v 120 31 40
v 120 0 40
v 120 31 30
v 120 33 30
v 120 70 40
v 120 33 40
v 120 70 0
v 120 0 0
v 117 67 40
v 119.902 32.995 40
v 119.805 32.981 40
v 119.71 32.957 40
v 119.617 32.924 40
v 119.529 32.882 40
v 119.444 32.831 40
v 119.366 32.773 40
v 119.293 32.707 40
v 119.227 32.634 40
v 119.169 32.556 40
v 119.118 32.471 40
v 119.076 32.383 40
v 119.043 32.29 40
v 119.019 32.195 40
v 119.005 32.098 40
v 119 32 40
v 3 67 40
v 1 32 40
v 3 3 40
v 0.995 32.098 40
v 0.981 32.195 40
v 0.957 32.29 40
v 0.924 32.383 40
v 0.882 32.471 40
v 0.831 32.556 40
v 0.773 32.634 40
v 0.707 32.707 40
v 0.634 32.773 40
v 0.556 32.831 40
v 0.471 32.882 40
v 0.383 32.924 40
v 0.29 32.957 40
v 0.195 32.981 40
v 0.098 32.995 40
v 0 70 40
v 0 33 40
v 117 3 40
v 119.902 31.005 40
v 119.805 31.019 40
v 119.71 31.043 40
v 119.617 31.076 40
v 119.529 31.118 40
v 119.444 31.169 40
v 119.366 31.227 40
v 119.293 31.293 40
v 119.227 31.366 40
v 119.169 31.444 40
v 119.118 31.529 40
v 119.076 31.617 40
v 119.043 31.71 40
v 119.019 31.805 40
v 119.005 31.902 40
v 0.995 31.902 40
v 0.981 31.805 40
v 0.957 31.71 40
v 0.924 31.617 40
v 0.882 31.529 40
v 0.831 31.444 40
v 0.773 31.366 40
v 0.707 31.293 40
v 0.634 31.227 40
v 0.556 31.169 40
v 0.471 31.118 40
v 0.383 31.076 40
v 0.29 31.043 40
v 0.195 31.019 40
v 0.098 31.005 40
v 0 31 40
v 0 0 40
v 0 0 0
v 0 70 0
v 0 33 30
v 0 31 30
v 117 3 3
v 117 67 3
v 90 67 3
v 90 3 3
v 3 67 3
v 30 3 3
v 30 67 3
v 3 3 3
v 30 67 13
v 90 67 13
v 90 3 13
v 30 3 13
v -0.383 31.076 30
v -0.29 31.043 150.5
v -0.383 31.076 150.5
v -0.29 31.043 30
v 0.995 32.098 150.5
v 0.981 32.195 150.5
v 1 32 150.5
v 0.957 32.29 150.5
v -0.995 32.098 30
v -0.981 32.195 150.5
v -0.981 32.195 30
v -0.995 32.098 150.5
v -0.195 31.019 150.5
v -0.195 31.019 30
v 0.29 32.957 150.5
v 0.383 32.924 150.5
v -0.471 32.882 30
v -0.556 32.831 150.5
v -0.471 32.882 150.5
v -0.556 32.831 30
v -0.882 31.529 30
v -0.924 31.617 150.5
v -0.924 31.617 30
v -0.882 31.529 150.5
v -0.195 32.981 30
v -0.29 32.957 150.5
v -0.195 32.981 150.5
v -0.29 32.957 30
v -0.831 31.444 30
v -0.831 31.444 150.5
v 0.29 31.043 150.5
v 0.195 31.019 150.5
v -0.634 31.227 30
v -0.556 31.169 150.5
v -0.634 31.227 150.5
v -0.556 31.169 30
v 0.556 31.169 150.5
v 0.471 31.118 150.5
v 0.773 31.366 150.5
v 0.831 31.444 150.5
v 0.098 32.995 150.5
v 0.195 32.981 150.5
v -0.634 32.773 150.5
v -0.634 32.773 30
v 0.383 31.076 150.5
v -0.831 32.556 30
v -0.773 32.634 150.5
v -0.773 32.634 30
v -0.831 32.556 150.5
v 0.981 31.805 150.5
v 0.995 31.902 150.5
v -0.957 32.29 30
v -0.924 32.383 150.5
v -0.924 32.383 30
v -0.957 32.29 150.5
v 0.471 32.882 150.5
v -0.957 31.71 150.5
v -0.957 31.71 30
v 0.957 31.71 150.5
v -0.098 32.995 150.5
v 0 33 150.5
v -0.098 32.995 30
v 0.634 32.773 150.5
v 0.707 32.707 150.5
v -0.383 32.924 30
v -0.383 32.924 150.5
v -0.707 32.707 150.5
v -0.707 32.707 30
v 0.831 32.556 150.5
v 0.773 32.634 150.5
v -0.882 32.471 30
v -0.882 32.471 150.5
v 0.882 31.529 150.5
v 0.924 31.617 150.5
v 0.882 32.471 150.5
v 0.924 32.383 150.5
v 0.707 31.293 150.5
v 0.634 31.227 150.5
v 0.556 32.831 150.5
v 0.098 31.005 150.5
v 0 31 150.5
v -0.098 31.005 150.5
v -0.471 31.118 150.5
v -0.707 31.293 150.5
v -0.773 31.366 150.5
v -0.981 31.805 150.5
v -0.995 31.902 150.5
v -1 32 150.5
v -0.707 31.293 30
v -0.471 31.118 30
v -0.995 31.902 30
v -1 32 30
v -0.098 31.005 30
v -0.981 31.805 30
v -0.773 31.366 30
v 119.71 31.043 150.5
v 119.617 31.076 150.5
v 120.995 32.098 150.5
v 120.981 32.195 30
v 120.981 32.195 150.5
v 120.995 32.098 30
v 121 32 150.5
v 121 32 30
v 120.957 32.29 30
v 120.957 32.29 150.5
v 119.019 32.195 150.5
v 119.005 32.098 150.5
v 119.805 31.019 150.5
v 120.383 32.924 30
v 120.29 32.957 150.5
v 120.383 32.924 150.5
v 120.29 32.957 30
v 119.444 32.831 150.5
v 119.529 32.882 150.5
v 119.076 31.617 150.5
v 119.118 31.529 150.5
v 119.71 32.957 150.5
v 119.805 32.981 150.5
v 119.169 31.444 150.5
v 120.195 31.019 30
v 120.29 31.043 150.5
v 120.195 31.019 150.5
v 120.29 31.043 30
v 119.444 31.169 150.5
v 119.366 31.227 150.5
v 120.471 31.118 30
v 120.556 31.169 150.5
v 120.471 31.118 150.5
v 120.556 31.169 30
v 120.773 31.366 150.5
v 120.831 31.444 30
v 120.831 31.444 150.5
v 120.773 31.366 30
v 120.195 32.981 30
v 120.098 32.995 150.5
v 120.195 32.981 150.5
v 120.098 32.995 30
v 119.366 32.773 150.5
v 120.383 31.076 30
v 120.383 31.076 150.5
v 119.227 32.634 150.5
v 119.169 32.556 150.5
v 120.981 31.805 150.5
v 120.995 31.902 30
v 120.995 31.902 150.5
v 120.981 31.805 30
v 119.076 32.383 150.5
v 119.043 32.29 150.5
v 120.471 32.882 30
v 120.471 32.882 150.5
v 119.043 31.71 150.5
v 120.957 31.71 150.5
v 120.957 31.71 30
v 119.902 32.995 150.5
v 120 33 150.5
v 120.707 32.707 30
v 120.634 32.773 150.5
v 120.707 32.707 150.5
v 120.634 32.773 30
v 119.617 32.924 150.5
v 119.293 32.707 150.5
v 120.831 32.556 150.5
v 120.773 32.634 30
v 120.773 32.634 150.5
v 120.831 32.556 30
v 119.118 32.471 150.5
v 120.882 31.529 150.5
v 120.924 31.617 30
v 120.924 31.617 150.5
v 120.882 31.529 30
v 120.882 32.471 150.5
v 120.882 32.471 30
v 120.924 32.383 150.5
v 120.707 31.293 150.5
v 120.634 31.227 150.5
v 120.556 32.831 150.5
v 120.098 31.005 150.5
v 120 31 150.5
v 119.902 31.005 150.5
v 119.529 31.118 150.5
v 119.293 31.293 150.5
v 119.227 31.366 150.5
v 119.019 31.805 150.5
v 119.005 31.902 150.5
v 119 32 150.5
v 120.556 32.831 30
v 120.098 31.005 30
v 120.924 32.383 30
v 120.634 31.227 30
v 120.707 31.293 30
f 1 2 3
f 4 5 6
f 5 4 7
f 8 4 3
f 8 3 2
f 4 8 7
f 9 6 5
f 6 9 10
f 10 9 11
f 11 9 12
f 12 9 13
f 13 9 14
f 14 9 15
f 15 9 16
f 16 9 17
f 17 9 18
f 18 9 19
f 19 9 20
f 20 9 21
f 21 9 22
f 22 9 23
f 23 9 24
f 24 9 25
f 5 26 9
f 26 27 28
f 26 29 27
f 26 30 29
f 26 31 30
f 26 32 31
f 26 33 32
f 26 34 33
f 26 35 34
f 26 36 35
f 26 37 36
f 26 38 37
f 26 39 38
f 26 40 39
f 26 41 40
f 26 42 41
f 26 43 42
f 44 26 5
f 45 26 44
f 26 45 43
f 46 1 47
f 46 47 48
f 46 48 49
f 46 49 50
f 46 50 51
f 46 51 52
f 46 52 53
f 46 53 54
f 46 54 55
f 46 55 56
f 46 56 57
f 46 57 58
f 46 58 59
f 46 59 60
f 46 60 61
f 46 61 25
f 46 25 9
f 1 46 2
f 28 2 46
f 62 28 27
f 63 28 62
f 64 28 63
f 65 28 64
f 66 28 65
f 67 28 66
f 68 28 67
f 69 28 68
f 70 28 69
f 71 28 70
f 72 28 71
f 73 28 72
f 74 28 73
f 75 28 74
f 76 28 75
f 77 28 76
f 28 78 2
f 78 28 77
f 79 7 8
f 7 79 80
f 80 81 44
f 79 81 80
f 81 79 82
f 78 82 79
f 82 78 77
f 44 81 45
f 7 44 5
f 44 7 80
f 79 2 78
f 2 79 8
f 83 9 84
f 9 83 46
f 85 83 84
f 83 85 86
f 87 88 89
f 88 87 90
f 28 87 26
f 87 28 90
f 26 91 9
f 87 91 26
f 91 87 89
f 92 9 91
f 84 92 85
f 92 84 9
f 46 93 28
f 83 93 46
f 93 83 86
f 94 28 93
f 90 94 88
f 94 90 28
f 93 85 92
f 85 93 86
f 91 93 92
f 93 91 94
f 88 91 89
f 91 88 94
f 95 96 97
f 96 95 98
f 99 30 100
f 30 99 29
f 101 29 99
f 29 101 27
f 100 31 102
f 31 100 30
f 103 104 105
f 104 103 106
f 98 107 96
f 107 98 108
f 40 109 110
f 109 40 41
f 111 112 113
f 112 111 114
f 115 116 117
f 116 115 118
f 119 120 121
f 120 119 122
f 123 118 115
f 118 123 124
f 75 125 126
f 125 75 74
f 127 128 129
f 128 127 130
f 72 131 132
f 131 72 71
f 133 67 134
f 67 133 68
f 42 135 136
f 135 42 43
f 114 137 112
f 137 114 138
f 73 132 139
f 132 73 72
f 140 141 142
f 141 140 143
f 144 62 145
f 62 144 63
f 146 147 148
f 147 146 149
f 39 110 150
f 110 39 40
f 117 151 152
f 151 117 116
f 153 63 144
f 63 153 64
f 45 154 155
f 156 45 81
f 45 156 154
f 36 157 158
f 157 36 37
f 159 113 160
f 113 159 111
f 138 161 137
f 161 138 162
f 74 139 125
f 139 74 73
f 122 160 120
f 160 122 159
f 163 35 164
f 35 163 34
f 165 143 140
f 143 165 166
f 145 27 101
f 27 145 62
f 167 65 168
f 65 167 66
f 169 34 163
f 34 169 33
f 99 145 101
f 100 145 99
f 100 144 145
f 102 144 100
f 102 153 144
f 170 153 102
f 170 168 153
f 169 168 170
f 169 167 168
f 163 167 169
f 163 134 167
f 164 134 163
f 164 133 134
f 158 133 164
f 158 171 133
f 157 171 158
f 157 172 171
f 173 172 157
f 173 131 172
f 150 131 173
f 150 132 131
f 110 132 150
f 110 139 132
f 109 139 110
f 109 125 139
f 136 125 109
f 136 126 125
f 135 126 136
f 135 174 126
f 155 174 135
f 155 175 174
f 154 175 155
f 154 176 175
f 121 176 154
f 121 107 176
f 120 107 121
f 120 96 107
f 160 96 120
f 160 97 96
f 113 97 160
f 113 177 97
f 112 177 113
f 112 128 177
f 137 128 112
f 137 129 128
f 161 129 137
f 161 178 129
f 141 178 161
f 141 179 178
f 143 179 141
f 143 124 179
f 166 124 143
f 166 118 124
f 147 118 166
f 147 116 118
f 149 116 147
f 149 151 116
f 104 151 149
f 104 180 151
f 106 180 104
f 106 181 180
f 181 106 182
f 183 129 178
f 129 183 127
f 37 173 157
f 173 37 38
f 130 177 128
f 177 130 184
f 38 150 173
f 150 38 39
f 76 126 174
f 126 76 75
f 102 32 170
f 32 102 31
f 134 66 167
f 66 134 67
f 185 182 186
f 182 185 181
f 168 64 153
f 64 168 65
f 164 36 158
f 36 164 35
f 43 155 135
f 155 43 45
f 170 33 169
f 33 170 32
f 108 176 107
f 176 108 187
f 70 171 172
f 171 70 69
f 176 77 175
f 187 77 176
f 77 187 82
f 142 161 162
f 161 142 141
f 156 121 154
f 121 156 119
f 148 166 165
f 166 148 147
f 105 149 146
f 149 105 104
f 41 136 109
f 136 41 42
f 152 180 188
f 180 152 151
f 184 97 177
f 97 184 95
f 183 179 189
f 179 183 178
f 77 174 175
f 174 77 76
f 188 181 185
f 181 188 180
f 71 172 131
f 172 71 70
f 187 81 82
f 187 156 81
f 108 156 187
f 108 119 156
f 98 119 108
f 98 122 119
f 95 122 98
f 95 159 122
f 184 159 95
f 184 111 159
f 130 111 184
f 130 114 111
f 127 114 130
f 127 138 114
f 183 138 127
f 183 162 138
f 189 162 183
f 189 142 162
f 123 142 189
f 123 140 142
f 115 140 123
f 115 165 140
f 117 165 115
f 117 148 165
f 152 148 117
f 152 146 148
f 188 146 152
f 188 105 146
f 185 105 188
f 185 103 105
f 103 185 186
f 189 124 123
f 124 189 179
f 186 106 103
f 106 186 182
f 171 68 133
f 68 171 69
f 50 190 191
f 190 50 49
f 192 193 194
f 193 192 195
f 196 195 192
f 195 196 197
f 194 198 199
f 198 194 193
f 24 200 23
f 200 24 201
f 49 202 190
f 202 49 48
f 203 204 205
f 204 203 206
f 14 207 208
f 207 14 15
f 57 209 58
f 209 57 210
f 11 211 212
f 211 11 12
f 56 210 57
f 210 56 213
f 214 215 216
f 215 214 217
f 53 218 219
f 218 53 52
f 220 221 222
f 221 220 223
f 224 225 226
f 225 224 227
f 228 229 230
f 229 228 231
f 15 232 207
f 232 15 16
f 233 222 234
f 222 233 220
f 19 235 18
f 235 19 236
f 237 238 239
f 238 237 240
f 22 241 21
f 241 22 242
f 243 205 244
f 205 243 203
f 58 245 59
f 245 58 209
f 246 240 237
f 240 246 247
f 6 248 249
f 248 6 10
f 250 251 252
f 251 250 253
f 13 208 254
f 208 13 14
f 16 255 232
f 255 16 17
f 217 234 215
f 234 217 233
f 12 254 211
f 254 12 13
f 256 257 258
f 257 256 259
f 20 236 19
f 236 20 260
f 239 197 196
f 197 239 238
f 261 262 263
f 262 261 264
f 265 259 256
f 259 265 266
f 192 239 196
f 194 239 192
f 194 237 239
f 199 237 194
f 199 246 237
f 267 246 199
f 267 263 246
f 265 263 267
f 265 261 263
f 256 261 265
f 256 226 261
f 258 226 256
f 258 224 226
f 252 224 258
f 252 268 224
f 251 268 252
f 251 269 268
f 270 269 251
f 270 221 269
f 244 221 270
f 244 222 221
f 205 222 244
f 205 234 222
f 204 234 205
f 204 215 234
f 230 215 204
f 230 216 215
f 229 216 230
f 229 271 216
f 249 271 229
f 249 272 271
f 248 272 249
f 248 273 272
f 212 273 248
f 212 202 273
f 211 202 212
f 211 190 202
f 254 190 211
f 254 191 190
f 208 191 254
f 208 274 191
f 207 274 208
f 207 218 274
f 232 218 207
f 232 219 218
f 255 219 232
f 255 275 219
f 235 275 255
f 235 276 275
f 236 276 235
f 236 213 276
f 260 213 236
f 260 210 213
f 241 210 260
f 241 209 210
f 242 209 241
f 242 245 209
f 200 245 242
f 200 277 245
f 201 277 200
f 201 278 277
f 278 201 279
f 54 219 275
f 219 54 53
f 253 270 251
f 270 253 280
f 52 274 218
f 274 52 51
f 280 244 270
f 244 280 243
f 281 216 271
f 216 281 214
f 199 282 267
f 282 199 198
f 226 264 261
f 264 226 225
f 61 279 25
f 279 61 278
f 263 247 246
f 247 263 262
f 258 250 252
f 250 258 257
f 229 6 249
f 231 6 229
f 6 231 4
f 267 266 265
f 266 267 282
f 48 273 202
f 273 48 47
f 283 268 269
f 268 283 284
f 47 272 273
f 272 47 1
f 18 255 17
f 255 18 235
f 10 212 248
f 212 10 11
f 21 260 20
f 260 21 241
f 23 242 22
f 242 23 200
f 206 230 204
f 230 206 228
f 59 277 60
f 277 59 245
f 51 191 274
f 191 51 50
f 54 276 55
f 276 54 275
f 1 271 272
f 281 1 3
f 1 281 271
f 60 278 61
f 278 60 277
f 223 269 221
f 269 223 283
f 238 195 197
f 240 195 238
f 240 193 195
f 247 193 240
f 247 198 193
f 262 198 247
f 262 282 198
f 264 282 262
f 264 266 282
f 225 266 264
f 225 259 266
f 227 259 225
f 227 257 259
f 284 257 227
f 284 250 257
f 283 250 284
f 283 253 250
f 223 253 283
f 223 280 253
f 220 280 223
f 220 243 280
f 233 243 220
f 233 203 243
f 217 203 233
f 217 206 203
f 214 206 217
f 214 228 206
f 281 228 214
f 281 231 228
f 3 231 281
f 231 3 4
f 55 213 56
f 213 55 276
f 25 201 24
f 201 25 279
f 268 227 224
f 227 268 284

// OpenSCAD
// Buffer Tank for Mini Horizontal Gel Electrophoresis
// Units: millimetres

// Outer Dimensions
$outer_x = 120;
$outer_y = 70;
$outer_z = 40;

// Wall and Floor Thickness
$wall_thickness = 3;
$floor_thickness = 3;

// Platform Dimensions
$platform_length = 60; // X dimension
$platform_width = $outer_y - (2 * $wall_thickness); // Spans full inner width
$platform_height = 10; // Height above inner floor
$platform_top_z = $floor_thickness + $platform_height; // Absolute Z of top surface

// Hole Dimensions
$hole_diameter = 2;
$hole_y = ($outer_y / 2) - ($wall_thickness); // Centered in Y relative to inner wall
$hole_z = 30; // Absolute Z position
$hole_extension = 0.5; // Extension past the face for clean cutting

// Resolution for curved shapes
$fn = 64;

// Helper function to calculate inner dimensions
$inner_x = $outer_x - (2 * $wall_thickness);
$inner_y = $outer_y - (2 * $wall_thickness);
$inner_z = $outer_z - $floor_thickness;

// Main Tank Body
// Constructed as a hollow box with a floor
difference() {
    // Outer Box
    cube([
        $outer_x, 
        $outer_y, 
        $outer_z
    ]);
    
    // Inner Void (Hollow space)
    // The void starts at z = $floor_thickness
    translate([
        $wall_thickness, 
        $wall_thickness, 
        $floor_thickness
    ]) {
        cube([
            $inner_x, 
            $inner_y, 
            $inner_z
        ]);
    }
}

// Raised Platform
// Positioned in the middle of the tank, spanning full inner width
translate([
    ($outer_x / 2) - ($platform_length / 2), 
    $wall_thickness, // Aligned with inner wall start
    $floor_thickness
]) {
    // Platform Base (to ensure it's solid and connects to tank walls if needed, 
    // though the prompt implies a solid raised platform. We make it a solid block 
    // sitting on the floor level).
    cube([
        $platform_length, 
        $platform_width, 
        $platform_height
    ]);
}

// Electrode Holes
// Two holes, one at each end (X = 0 and X = $outer_x), 
// along the Y axis at the specified Y and Z.
// We use difference to cut these out of the existing solid.

// Left End Hole
translate([
    0, 
    $hole_y, 
    $hole_z
]) {
    cylinder(
        h = $outer_x + $hole_extension, // Extend past both ends
        r = $hole_diameter / 2,
        $fn = $fn
    );
}

// Right End Hole
translate([
    $outer_x, 
    $hole_y, 
    $hole_z
]) {
    cylinder(
        h = $outer_x + $hole_extension, // Extend past both ends
        r = $hole_diameter / 2,
        $fn = $fn
    );
}
